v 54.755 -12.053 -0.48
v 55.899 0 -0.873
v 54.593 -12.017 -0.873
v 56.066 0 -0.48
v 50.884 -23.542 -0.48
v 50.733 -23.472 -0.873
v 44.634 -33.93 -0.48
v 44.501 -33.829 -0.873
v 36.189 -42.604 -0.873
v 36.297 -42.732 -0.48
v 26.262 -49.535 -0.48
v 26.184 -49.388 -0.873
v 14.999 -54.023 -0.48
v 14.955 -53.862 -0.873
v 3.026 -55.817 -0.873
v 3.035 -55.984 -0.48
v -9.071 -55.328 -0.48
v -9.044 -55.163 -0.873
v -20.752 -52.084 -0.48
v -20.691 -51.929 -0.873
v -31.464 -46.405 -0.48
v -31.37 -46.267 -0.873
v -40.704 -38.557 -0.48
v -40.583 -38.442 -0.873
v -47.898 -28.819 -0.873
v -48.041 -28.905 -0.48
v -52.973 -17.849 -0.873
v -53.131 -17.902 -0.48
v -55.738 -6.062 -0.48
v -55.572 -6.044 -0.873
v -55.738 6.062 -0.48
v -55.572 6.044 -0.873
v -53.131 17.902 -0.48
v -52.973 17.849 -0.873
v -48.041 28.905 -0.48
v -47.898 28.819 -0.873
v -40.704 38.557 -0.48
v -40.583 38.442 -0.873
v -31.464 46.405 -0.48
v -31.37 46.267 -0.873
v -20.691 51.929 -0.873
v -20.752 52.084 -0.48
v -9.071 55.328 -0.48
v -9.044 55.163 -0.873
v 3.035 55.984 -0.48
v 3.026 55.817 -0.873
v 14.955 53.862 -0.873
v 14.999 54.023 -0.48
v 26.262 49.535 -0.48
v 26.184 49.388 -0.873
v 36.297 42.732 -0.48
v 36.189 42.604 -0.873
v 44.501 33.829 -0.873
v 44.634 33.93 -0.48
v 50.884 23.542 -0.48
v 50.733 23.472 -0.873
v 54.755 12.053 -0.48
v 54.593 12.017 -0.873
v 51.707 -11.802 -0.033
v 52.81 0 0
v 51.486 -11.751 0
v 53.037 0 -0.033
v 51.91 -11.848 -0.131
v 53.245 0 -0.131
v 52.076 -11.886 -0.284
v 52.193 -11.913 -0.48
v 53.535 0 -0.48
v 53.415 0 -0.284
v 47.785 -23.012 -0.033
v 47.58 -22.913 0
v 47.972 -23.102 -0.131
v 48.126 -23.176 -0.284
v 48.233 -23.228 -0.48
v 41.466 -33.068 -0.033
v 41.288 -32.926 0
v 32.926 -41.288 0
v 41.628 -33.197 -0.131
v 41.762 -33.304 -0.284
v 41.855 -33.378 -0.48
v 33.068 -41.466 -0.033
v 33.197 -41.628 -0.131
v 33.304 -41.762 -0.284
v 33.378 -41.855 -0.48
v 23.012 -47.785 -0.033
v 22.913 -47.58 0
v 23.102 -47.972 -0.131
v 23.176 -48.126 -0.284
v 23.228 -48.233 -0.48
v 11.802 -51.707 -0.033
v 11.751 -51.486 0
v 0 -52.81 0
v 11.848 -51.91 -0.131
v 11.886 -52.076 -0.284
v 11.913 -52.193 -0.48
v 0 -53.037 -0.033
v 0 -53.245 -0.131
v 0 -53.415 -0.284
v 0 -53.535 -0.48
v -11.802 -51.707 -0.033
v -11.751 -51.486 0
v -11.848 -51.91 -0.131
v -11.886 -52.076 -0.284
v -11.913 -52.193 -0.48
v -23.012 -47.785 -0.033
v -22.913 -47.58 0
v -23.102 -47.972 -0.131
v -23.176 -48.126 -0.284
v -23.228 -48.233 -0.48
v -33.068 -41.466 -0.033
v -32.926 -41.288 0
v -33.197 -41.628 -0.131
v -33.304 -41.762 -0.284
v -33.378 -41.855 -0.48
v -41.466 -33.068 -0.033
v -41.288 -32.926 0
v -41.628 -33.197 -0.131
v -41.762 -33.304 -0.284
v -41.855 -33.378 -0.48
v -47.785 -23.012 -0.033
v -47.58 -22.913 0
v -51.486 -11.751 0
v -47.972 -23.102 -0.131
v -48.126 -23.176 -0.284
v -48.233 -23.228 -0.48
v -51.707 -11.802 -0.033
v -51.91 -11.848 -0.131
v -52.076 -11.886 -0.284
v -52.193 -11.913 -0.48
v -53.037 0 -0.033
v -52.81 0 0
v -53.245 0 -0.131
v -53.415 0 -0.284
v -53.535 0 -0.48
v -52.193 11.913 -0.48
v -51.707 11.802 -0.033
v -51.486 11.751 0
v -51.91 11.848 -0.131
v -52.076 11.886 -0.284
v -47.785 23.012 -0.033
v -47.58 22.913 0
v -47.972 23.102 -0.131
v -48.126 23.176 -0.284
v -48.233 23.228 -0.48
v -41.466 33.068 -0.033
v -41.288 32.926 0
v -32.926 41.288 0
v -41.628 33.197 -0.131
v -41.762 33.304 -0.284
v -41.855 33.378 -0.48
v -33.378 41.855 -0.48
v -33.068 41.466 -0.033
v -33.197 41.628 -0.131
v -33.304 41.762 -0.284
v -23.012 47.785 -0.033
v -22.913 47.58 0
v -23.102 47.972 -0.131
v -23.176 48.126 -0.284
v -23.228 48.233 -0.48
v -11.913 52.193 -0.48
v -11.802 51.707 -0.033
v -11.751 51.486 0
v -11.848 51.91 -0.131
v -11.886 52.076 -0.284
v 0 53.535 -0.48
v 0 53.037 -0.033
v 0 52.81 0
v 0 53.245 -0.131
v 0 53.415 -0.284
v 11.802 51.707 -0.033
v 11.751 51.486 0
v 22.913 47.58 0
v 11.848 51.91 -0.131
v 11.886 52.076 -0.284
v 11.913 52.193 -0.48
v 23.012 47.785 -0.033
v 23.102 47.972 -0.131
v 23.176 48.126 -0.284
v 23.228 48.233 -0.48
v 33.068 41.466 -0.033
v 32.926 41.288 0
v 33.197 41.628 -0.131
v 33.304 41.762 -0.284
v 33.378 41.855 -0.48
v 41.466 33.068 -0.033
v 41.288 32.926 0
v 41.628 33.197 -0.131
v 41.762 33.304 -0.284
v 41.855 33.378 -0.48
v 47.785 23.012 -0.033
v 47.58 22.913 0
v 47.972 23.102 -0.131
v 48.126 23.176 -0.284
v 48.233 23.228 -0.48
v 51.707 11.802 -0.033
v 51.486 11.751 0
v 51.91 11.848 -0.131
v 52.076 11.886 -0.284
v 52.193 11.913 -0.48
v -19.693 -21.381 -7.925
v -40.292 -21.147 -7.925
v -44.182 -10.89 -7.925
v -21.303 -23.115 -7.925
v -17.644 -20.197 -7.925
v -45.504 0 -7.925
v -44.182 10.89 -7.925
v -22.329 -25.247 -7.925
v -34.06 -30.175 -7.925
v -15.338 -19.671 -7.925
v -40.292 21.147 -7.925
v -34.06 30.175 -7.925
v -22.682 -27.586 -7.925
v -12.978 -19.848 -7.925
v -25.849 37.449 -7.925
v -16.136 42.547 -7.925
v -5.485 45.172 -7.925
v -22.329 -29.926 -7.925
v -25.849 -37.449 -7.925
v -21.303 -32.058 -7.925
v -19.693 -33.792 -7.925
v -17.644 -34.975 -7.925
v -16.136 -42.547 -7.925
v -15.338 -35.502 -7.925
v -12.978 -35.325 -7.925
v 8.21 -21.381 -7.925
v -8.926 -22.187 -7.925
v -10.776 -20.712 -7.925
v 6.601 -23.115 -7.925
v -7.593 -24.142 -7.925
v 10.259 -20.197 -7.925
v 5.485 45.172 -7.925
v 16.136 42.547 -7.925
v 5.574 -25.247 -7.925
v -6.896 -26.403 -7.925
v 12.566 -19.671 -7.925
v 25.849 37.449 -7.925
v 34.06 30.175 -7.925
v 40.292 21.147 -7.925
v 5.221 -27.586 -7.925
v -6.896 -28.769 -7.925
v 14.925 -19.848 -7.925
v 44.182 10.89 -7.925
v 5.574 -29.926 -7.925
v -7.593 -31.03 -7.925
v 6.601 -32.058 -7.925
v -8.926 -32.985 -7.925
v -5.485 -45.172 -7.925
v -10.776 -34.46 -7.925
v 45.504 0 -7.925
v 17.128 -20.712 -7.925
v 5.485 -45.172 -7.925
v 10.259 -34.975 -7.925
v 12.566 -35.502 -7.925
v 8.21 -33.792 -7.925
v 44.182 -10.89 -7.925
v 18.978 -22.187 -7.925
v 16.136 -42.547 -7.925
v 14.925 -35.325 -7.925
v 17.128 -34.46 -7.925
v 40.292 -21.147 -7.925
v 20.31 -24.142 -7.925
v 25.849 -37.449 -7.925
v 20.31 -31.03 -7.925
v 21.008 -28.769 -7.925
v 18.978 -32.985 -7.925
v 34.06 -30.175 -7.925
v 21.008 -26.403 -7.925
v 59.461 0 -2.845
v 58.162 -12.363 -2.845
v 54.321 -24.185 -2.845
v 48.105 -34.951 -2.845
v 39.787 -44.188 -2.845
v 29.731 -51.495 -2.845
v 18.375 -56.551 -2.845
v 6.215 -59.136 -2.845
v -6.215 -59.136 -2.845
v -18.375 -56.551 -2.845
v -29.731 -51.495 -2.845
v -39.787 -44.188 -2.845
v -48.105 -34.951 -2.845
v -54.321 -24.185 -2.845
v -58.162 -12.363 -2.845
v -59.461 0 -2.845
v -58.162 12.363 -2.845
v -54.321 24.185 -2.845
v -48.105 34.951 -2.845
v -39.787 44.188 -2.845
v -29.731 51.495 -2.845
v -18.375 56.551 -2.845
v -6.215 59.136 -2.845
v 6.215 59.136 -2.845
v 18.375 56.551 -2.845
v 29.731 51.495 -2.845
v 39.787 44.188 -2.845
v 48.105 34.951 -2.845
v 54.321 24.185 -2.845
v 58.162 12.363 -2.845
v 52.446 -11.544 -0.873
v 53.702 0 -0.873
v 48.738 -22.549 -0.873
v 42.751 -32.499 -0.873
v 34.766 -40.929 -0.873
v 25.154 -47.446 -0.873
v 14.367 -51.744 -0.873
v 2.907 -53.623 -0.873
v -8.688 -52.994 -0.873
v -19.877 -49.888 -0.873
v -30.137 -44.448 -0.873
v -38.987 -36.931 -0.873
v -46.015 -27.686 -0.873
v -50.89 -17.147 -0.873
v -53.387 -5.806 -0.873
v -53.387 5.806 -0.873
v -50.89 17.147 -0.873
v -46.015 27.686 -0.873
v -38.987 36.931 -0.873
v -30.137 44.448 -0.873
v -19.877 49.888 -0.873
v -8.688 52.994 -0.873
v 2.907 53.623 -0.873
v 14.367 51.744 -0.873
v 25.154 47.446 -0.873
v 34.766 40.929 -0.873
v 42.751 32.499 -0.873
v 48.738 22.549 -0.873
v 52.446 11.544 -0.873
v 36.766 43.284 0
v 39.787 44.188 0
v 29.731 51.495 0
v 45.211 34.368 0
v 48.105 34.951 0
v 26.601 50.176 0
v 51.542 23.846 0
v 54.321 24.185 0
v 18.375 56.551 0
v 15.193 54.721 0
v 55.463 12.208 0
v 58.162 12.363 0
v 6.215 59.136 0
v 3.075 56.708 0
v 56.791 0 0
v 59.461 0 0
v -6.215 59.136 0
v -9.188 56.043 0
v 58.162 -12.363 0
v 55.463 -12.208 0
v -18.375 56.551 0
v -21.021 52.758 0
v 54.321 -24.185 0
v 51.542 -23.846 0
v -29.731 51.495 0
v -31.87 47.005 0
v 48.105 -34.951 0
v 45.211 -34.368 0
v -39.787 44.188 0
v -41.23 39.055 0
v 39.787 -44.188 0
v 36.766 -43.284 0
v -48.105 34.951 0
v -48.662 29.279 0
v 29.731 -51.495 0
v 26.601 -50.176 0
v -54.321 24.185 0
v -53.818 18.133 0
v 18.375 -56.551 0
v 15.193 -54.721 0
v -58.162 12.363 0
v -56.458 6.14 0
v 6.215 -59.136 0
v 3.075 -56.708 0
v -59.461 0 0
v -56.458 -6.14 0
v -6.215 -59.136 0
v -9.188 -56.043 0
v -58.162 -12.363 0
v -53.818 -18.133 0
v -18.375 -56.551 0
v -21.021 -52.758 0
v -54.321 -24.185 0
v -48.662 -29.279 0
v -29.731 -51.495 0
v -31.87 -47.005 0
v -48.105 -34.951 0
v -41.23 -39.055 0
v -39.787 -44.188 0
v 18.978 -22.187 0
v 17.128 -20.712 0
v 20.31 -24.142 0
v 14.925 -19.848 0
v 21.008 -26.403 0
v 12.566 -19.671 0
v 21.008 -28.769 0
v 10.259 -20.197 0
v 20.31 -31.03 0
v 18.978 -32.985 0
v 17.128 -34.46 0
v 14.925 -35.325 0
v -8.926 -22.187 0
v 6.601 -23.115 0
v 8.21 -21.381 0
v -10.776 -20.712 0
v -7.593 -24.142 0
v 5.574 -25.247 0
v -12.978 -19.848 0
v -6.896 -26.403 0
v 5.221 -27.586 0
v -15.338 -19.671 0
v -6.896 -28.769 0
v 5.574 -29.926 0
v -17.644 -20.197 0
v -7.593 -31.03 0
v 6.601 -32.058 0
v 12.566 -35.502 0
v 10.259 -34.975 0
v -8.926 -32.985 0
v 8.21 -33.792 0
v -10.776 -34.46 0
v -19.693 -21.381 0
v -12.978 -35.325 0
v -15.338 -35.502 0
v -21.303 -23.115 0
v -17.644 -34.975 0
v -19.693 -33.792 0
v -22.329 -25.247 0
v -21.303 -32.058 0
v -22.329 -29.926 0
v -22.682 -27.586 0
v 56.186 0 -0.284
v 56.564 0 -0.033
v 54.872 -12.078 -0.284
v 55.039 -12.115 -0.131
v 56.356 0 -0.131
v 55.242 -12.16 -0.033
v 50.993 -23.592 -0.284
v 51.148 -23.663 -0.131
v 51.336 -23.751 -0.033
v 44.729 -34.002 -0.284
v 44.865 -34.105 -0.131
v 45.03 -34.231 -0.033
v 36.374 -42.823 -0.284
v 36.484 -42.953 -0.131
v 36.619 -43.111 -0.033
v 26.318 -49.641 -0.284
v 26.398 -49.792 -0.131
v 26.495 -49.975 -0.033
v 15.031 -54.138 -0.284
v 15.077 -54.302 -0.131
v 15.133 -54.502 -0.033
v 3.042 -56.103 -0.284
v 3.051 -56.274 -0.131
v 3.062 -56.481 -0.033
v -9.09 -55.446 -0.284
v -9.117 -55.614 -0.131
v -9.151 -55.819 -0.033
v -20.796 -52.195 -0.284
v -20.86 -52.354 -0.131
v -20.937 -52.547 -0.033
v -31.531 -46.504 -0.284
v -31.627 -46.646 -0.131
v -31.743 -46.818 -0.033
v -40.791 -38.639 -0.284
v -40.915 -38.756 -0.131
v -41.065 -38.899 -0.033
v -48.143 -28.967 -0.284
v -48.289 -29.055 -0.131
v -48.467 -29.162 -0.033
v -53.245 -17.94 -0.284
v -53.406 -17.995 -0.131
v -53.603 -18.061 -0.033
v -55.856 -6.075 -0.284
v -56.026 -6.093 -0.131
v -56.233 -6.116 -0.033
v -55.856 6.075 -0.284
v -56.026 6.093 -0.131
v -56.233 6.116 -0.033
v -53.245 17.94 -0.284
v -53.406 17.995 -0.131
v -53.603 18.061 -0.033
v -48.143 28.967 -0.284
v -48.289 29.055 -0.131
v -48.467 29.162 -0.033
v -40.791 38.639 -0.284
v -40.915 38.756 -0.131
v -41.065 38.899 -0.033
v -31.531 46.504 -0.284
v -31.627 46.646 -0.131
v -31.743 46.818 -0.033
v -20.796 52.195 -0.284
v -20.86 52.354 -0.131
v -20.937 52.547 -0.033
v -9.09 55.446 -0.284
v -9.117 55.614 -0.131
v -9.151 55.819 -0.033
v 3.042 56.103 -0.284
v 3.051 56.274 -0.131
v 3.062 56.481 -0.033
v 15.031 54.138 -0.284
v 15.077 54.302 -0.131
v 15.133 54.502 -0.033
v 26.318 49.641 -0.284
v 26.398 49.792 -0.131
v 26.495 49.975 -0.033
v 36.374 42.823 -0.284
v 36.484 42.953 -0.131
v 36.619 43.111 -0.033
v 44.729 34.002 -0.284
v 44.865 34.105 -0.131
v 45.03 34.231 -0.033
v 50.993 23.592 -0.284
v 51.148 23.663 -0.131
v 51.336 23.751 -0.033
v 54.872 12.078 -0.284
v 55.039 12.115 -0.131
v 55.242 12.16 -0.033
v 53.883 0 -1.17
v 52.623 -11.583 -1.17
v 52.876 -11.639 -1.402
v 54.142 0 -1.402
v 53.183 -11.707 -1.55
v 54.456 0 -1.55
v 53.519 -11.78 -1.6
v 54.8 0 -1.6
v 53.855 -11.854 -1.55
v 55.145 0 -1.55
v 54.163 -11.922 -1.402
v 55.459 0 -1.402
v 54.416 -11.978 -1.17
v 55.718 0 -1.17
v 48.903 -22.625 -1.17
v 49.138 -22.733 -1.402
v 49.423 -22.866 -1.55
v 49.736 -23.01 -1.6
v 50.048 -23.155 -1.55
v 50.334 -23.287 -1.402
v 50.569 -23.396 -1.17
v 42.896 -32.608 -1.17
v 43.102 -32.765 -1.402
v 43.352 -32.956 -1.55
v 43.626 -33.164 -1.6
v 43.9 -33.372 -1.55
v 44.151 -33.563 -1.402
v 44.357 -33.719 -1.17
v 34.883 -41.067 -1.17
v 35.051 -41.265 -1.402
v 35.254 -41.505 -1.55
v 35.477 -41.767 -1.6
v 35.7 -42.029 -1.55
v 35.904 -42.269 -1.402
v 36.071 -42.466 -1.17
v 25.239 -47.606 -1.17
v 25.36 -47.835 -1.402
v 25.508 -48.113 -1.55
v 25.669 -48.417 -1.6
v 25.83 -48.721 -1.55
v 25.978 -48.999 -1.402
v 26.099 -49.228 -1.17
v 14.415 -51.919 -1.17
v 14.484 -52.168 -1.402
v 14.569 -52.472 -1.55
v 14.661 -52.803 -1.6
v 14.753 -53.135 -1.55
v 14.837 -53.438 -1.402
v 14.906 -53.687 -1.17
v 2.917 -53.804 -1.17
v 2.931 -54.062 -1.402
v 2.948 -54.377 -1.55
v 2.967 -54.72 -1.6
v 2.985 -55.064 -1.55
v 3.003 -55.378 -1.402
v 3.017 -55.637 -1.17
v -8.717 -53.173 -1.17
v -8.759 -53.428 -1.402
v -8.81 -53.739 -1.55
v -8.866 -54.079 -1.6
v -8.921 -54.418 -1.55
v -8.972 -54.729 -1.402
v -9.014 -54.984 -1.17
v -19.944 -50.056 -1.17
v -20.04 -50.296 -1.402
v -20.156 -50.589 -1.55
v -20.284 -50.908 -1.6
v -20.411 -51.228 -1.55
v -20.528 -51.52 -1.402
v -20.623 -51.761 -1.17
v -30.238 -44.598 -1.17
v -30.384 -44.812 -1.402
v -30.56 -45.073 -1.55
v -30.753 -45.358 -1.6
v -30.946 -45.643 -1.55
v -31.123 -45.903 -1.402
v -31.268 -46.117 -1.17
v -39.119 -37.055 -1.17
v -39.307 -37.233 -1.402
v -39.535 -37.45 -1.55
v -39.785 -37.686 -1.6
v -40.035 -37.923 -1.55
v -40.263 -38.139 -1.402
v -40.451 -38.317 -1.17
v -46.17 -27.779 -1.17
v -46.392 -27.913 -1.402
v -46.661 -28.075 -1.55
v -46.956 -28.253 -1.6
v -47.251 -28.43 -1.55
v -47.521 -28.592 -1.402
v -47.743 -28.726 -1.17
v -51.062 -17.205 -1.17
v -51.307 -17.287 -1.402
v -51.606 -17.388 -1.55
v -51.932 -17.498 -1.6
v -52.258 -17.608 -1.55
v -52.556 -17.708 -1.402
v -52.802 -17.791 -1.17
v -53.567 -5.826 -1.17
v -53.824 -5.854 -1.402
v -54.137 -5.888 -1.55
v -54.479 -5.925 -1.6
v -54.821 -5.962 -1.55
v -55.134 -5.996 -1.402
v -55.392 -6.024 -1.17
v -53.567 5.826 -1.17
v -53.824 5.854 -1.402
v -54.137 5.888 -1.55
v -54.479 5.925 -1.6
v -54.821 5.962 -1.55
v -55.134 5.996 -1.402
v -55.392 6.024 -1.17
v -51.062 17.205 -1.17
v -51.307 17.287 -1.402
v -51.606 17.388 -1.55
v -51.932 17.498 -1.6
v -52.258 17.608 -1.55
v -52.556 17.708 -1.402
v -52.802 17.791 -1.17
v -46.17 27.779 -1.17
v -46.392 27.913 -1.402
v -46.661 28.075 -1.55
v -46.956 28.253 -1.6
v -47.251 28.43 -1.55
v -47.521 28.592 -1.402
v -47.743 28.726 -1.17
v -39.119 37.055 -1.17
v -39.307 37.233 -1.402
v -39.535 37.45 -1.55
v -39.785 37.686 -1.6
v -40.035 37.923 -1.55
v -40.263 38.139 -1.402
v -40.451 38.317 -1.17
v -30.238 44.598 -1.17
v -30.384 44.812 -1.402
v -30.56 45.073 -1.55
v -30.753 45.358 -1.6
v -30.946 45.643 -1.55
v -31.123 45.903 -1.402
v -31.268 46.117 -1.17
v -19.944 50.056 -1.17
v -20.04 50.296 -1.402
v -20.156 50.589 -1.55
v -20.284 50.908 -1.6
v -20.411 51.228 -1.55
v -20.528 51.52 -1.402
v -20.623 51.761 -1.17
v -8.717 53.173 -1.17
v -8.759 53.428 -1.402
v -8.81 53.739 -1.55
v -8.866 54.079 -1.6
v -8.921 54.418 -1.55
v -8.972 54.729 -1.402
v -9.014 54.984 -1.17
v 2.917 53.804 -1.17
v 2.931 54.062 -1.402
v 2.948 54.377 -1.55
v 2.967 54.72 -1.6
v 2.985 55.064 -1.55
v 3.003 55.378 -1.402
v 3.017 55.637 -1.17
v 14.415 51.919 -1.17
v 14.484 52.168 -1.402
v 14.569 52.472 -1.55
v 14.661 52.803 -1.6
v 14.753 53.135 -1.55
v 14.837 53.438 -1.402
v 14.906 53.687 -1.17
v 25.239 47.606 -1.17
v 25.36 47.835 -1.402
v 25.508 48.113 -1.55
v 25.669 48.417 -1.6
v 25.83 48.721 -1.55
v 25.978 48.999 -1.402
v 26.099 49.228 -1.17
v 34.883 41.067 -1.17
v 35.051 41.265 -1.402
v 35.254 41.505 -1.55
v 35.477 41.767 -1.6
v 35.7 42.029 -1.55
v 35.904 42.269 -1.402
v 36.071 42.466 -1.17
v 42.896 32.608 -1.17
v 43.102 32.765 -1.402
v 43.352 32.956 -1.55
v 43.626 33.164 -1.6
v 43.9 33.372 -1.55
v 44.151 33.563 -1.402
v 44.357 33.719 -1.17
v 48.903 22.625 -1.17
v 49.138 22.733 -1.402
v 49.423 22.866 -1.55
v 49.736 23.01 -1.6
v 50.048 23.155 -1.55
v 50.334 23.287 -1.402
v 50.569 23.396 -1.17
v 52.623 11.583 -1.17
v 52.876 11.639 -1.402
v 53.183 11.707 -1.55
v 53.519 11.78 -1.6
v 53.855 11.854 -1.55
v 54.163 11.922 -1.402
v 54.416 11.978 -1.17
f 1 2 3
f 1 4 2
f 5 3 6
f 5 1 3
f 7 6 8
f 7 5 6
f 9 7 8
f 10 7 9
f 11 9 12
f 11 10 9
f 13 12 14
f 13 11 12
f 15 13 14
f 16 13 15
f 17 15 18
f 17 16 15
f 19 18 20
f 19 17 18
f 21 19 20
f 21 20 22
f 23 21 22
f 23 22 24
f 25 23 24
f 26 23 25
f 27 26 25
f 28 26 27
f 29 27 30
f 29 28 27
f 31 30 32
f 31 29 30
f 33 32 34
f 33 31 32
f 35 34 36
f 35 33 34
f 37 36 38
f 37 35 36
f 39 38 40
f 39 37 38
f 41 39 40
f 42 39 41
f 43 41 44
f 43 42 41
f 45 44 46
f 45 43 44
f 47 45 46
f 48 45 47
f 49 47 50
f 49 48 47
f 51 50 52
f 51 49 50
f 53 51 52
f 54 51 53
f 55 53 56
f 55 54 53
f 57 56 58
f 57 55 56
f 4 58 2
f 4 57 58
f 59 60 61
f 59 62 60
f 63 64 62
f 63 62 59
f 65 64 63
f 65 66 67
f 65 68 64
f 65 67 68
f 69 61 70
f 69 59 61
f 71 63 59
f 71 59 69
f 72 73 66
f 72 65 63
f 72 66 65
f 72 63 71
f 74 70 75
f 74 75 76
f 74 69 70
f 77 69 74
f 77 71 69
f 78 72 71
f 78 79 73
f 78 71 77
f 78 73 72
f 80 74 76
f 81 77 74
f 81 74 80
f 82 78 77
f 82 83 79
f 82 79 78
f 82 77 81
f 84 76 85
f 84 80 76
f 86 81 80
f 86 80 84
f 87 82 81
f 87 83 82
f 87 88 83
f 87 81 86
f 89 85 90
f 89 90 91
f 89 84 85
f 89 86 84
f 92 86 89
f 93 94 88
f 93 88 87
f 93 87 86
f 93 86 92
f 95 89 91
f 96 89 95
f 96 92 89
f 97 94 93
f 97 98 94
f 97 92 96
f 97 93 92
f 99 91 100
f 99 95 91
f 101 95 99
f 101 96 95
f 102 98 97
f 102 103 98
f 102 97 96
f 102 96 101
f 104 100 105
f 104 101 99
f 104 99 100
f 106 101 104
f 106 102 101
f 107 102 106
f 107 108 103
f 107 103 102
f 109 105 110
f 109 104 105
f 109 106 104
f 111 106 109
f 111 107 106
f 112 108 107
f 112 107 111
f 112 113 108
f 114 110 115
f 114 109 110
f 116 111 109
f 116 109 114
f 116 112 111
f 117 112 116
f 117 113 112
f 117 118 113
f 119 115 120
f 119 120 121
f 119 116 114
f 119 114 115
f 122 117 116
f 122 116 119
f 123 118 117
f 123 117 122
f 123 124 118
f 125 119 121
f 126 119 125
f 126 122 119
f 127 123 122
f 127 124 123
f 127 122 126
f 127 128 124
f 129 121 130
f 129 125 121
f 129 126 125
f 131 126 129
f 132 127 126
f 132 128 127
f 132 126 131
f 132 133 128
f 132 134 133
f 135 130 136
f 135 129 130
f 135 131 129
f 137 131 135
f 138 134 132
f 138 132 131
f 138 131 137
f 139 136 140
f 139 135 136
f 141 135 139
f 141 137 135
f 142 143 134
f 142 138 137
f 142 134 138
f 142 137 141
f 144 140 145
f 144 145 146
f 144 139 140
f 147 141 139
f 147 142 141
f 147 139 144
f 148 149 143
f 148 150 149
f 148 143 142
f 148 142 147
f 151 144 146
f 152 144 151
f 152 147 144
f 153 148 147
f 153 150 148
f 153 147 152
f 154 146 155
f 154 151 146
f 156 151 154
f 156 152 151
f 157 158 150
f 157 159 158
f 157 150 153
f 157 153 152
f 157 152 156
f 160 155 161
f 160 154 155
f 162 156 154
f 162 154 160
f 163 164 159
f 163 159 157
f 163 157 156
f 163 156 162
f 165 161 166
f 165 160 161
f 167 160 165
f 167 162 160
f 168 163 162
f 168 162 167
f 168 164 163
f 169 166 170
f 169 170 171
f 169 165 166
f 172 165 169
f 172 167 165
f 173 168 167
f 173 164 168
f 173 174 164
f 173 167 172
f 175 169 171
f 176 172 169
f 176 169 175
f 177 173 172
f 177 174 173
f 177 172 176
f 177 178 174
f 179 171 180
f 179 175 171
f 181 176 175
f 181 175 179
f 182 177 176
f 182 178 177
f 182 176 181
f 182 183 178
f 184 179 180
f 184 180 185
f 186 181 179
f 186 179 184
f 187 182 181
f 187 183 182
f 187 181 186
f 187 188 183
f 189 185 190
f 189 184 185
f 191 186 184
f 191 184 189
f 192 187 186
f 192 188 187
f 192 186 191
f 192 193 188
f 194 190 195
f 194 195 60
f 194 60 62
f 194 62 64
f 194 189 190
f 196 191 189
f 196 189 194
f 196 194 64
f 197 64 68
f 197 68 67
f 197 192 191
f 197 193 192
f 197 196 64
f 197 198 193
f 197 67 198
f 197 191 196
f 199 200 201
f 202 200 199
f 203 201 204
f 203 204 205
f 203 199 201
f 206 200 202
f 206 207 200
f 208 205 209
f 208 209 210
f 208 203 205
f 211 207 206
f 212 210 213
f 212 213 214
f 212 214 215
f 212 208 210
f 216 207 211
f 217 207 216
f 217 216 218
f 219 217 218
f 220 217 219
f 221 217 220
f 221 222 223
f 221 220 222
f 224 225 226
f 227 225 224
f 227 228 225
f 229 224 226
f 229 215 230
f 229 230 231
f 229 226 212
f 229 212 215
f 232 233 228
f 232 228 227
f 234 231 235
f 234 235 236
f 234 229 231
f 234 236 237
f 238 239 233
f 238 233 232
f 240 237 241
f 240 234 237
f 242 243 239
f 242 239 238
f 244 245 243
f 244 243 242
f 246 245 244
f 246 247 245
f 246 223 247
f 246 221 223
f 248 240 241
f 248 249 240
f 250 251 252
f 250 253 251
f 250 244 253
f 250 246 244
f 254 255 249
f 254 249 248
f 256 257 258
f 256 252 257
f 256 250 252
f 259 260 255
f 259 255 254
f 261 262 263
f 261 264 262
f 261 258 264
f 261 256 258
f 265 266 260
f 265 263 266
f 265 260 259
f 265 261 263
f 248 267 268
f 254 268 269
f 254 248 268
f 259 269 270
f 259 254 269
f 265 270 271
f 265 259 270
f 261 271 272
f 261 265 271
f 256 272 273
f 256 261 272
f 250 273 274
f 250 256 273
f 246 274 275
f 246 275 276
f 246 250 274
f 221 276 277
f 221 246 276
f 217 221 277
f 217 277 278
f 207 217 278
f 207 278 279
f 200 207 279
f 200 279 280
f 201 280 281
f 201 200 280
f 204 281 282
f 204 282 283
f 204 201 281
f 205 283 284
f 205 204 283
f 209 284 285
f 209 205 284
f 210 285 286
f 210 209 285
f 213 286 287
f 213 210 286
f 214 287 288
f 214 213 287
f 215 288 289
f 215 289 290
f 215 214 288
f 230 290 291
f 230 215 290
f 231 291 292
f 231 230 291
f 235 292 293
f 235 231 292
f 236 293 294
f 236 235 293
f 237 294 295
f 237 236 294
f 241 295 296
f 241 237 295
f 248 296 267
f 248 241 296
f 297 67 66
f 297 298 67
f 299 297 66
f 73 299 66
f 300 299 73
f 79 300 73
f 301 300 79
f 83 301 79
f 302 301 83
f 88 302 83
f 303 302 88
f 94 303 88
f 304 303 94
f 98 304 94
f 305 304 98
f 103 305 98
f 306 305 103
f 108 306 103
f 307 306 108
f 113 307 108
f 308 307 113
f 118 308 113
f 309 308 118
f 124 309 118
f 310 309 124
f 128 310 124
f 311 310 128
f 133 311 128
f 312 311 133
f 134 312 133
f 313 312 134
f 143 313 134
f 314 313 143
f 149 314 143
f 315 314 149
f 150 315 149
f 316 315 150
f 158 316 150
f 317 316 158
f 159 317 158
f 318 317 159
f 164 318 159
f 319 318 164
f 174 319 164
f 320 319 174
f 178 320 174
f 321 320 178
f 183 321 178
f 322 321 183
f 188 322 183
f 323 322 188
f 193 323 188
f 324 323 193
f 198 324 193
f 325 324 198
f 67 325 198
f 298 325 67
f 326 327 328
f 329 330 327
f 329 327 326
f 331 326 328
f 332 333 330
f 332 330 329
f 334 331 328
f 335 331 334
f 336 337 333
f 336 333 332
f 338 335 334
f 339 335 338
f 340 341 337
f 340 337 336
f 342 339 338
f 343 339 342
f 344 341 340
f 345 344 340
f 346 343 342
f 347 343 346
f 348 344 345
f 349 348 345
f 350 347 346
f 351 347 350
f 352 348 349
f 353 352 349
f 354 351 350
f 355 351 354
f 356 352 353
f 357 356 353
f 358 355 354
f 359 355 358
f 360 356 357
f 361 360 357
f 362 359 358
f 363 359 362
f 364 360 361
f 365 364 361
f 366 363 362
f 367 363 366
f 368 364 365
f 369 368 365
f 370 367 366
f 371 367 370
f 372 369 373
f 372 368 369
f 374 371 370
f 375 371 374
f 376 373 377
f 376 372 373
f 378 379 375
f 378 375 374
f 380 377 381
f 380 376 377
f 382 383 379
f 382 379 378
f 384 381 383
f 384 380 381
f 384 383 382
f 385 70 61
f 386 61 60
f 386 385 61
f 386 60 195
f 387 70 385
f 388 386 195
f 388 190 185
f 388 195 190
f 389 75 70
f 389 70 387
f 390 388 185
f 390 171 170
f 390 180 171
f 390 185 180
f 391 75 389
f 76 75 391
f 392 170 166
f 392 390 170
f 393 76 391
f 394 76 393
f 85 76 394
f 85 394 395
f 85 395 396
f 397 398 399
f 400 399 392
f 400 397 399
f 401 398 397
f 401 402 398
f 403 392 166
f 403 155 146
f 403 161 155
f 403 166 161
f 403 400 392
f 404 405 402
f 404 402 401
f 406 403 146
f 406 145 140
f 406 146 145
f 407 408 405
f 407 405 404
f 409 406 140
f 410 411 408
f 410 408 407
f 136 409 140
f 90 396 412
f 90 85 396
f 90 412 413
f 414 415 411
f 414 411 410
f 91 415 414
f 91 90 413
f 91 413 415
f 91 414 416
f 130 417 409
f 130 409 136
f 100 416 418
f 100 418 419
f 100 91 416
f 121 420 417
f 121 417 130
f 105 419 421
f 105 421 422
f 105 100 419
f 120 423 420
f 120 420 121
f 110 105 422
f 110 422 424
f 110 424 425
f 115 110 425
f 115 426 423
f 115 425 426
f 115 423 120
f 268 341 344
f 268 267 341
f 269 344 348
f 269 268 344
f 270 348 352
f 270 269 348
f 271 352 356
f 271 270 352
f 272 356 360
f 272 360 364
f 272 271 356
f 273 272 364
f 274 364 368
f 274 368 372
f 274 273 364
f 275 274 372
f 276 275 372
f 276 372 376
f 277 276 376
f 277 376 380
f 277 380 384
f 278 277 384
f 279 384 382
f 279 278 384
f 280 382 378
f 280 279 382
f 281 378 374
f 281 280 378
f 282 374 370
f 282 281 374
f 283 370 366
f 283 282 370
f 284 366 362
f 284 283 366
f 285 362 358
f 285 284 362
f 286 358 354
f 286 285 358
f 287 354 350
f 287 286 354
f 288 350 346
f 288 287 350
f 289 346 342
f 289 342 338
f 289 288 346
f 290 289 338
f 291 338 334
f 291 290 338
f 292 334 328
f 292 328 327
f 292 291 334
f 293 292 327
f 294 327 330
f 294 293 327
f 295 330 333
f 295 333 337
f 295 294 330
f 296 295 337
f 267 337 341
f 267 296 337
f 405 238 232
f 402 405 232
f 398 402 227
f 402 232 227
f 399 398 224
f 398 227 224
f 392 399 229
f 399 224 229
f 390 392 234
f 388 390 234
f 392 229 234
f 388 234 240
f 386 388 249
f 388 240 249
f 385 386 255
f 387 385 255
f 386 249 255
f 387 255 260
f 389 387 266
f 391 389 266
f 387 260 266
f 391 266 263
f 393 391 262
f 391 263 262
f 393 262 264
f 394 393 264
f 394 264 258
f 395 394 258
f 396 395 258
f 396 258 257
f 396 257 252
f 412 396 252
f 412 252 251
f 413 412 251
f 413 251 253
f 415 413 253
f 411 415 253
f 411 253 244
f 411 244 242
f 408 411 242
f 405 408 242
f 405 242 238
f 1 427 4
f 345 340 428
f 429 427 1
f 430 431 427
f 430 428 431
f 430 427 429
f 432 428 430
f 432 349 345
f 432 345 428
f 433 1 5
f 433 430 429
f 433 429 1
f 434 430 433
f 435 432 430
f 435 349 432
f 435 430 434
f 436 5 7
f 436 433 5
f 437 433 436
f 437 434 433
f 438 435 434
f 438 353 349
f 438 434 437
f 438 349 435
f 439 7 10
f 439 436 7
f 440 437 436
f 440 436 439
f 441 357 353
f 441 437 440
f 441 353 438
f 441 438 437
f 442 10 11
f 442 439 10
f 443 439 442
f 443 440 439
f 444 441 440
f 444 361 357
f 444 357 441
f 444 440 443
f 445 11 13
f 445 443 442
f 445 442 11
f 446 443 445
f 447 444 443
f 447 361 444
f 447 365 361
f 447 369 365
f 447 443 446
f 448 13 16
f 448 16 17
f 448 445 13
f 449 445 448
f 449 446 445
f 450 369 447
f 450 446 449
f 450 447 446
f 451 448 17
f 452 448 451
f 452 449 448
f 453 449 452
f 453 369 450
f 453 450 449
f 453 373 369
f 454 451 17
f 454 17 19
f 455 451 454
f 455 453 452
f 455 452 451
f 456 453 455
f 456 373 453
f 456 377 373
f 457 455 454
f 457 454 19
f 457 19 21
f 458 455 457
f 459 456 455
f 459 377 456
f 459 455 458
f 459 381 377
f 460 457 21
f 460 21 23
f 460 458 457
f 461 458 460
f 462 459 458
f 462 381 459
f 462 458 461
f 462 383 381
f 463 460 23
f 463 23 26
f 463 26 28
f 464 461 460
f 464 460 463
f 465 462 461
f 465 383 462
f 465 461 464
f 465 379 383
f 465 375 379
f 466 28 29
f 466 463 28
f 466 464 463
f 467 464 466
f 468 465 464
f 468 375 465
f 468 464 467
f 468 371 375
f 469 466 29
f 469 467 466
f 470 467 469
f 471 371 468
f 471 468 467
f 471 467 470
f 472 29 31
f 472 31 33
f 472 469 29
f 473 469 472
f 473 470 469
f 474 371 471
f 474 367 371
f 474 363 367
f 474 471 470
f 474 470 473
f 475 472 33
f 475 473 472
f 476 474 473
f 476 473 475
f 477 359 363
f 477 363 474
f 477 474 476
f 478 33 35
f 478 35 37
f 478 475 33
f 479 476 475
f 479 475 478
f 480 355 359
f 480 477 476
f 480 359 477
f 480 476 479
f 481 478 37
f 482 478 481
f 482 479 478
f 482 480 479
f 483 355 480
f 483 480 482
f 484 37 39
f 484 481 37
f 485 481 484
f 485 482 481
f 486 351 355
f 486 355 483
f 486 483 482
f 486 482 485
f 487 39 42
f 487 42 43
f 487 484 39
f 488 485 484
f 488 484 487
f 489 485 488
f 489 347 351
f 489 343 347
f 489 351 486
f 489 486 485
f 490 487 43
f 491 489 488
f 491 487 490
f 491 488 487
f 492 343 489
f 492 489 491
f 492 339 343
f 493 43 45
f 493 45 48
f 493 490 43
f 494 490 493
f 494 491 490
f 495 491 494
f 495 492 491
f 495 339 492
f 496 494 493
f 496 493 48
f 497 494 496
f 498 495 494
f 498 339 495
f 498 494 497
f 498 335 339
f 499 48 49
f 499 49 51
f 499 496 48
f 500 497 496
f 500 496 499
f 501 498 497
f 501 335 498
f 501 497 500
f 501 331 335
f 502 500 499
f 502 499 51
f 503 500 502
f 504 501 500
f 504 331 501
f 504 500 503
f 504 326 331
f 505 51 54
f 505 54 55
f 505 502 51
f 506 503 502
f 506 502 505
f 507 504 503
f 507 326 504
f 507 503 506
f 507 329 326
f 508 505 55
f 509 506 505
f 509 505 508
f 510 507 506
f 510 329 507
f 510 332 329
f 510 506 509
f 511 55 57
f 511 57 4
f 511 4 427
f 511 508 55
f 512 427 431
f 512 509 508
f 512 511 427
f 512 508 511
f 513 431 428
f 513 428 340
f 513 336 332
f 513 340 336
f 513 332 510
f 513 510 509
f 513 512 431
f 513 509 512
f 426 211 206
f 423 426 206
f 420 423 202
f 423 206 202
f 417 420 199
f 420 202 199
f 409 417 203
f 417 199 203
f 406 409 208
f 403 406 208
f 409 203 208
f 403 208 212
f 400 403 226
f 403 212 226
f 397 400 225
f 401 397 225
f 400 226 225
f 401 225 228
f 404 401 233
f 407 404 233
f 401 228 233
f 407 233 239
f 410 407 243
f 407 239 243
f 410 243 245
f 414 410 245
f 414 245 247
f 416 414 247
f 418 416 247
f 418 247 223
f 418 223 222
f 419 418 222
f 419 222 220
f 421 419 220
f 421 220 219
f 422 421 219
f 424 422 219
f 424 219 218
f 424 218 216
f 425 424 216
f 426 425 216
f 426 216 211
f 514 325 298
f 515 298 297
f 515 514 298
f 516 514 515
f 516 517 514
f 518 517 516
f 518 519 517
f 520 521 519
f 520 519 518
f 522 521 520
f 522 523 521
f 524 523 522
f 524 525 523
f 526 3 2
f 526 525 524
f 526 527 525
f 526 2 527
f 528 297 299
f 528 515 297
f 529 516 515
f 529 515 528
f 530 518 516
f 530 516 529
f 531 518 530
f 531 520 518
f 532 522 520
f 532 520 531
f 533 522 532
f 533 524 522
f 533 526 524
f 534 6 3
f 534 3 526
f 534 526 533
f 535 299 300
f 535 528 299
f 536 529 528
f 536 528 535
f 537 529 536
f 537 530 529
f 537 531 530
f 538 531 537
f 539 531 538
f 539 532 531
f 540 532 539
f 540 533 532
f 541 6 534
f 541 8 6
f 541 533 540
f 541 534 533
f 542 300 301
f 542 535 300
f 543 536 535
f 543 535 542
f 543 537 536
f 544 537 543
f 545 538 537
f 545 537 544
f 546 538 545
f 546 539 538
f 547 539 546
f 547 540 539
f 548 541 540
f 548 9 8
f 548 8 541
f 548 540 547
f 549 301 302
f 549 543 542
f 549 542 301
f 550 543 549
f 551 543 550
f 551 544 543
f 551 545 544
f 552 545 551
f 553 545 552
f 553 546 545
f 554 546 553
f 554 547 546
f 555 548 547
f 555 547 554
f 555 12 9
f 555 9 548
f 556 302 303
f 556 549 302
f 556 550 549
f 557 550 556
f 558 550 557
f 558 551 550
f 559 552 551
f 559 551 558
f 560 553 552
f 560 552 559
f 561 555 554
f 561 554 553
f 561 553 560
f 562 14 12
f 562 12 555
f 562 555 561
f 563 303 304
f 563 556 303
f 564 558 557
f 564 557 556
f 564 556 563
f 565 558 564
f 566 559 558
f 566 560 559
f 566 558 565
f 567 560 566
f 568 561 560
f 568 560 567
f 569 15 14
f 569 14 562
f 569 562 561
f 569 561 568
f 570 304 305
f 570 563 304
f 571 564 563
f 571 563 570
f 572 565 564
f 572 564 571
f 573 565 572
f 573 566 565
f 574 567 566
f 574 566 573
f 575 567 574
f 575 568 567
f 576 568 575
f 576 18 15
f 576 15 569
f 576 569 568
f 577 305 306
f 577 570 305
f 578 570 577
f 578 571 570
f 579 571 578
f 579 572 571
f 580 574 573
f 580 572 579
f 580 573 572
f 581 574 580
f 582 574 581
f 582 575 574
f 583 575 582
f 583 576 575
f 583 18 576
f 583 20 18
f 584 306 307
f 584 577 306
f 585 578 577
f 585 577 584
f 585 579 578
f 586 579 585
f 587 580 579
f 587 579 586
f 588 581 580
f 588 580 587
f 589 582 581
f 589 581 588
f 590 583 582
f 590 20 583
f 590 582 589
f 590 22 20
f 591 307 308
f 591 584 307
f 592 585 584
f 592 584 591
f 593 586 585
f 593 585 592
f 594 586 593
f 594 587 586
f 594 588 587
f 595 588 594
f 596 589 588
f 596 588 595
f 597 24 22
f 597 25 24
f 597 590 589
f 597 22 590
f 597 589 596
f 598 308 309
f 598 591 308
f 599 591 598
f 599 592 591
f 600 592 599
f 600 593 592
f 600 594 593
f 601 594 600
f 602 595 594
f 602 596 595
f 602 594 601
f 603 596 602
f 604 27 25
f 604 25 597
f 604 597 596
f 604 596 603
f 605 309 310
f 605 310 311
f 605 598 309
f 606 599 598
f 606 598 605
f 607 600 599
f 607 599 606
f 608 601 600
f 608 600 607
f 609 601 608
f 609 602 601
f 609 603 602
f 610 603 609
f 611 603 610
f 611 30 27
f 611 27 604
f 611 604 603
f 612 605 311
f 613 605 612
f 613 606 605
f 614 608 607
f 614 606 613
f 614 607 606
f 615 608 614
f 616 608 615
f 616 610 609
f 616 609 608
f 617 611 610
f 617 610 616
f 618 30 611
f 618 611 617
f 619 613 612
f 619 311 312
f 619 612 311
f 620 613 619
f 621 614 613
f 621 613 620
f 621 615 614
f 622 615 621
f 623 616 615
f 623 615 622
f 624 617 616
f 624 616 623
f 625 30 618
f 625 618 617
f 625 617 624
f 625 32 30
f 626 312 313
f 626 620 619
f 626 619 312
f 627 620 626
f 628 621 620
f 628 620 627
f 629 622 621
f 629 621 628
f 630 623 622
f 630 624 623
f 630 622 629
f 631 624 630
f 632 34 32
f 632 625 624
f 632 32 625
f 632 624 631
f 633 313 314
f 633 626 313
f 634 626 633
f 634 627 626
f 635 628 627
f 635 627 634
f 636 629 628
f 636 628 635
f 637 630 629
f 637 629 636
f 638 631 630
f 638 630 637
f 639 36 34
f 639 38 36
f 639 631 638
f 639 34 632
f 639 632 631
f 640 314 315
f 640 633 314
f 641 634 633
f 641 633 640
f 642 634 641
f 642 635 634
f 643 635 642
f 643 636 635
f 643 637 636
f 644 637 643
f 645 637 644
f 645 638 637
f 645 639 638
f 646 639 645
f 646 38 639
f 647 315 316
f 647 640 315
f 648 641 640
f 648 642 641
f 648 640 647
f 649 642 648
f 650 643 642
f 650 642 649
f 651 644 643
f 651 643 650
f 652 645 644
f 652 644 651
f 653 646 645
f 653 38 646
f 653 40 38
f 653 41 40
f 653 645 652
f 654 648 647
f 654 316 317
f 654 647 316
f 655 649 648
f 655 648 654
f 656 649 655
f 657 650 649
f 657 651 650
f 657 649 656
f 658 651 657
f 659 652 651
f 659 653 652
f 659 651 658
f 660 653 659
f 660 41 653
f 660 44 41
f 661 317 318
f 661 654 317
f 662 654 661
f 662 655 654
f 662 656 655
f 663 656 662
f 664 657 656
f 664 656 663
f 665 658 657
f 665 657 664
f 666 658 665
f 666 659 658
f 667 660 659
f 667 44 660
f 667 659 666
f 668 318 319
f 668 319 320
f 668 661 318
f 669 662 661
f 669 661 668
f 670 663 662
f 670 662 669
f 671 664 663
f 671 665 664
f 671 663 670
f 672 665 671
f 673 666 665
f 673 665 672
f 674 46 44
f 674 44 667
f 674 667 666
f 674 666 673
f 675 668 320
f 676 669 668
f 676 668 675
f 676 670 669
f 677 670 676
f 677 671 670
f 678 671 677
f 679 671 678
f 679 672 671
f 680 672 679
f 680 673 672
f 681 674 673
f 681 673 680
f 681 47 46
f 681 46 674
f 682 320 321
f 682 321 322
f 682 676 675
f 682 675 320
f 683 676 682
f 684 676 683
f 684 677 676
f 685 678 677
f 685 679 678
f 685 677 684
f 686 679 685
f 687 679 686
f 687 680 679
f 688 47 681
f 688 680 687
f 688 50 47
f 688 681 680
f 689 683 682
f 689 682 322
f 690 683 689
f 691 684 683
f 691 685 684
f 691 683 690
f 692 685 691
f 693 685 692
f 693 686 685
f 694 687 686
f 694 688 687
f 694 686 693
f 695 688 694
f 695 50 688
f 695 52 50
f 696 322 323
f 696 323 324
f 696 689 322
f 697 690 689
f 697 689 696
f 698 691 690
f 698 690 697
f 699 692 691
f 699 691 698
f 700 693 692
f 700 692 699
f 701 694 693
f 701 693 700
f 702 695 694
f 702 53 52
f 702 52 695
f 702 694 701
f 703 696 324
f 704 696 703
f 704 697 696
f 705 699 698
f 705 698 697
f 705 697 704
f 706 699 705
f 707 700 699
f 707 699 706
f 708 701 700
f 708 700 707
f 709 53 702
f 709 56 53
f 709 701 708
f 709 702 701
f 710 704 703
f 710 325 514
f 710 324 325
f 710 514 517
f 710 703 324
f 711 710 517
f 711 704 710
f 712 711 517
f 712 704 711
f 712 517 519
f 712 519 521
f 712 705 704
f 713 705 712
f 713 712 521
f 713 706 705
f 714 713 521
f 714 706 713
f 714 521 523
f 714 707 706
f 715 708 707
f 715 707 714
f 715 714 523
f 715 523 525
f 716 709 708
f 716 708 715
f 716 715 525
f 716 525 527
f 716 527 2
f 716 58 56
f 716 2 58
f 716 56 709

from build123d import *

# Parameters (mm, degrees)
SKETCH2_R          = 7.9375
CUT_EXTRUDE1_DEPTH = 85.463711951


with BuildPart() as part:
    # Sketch1 → Revolve1 (revolve)
    with BuildSketch(Plane(origin=(0, 0, 0), x_dir=(0, 0, -1), z_dir=(1, 0, 0)), mode=Mode.PRIVATE) as revolve1_sk:
        with BuildLine():
            Line((0, 0), (0, 52.809927725))
            ThreePointArc((0, 52.809927725), (0.130798304, 53.244522907), (0.479738309, 53.534733247))
            Line((0.479738309, 53.534733247), (0.872854821, 53.701601306))
            ThreePointArc((0.872854821, 53.701601306), (1.6002, 54.8005), (0.872854821, 55.899398694))
            Line((0.872854821, 55.899398694), (0.479738309, 56.066266753))
            ThreePointArc((0.479738309, 56.066266753), (0.130798304, 56.356477093), (0, 56.791072275))
            Line((0, 56.791072275), (0, 59.4614))
            Line((0, 59.4614), (2.8448, 59.4614))
            Line((2.8448, 59.4614), (7.9248, 45.504214709))
            Line((7.9248, 45.504214709), (7.9248, 0))
            Line((7.9248, 0), (0, 0))
        make_face()
    revolve(revolve1_sk.sketch.rotate(Axis((0, 0, 0), (0, 0, -1)), 90), axis=Axis((0, 0, 0), (0, 0, -1)))

    # Sketch2 → Cut-Extrude1 (cut, through all)
    with BuildSketch(Plane(origin=(0, 0, -7.9248), x_dir=(-1, 0, 0), z_dir=(0, 0, -1))):
        with Locations((-13.158980507, -27.586296484)):
            Circle(SKETCH2_R)
        with Locations((14.744399845, -27.586296484)):
            Circle(SKETCH2_R)
    extrude(amount=-CUT_EXTRUDE1_DEPTH, mode=Mode.SUBTRACT)


solid = part.part
